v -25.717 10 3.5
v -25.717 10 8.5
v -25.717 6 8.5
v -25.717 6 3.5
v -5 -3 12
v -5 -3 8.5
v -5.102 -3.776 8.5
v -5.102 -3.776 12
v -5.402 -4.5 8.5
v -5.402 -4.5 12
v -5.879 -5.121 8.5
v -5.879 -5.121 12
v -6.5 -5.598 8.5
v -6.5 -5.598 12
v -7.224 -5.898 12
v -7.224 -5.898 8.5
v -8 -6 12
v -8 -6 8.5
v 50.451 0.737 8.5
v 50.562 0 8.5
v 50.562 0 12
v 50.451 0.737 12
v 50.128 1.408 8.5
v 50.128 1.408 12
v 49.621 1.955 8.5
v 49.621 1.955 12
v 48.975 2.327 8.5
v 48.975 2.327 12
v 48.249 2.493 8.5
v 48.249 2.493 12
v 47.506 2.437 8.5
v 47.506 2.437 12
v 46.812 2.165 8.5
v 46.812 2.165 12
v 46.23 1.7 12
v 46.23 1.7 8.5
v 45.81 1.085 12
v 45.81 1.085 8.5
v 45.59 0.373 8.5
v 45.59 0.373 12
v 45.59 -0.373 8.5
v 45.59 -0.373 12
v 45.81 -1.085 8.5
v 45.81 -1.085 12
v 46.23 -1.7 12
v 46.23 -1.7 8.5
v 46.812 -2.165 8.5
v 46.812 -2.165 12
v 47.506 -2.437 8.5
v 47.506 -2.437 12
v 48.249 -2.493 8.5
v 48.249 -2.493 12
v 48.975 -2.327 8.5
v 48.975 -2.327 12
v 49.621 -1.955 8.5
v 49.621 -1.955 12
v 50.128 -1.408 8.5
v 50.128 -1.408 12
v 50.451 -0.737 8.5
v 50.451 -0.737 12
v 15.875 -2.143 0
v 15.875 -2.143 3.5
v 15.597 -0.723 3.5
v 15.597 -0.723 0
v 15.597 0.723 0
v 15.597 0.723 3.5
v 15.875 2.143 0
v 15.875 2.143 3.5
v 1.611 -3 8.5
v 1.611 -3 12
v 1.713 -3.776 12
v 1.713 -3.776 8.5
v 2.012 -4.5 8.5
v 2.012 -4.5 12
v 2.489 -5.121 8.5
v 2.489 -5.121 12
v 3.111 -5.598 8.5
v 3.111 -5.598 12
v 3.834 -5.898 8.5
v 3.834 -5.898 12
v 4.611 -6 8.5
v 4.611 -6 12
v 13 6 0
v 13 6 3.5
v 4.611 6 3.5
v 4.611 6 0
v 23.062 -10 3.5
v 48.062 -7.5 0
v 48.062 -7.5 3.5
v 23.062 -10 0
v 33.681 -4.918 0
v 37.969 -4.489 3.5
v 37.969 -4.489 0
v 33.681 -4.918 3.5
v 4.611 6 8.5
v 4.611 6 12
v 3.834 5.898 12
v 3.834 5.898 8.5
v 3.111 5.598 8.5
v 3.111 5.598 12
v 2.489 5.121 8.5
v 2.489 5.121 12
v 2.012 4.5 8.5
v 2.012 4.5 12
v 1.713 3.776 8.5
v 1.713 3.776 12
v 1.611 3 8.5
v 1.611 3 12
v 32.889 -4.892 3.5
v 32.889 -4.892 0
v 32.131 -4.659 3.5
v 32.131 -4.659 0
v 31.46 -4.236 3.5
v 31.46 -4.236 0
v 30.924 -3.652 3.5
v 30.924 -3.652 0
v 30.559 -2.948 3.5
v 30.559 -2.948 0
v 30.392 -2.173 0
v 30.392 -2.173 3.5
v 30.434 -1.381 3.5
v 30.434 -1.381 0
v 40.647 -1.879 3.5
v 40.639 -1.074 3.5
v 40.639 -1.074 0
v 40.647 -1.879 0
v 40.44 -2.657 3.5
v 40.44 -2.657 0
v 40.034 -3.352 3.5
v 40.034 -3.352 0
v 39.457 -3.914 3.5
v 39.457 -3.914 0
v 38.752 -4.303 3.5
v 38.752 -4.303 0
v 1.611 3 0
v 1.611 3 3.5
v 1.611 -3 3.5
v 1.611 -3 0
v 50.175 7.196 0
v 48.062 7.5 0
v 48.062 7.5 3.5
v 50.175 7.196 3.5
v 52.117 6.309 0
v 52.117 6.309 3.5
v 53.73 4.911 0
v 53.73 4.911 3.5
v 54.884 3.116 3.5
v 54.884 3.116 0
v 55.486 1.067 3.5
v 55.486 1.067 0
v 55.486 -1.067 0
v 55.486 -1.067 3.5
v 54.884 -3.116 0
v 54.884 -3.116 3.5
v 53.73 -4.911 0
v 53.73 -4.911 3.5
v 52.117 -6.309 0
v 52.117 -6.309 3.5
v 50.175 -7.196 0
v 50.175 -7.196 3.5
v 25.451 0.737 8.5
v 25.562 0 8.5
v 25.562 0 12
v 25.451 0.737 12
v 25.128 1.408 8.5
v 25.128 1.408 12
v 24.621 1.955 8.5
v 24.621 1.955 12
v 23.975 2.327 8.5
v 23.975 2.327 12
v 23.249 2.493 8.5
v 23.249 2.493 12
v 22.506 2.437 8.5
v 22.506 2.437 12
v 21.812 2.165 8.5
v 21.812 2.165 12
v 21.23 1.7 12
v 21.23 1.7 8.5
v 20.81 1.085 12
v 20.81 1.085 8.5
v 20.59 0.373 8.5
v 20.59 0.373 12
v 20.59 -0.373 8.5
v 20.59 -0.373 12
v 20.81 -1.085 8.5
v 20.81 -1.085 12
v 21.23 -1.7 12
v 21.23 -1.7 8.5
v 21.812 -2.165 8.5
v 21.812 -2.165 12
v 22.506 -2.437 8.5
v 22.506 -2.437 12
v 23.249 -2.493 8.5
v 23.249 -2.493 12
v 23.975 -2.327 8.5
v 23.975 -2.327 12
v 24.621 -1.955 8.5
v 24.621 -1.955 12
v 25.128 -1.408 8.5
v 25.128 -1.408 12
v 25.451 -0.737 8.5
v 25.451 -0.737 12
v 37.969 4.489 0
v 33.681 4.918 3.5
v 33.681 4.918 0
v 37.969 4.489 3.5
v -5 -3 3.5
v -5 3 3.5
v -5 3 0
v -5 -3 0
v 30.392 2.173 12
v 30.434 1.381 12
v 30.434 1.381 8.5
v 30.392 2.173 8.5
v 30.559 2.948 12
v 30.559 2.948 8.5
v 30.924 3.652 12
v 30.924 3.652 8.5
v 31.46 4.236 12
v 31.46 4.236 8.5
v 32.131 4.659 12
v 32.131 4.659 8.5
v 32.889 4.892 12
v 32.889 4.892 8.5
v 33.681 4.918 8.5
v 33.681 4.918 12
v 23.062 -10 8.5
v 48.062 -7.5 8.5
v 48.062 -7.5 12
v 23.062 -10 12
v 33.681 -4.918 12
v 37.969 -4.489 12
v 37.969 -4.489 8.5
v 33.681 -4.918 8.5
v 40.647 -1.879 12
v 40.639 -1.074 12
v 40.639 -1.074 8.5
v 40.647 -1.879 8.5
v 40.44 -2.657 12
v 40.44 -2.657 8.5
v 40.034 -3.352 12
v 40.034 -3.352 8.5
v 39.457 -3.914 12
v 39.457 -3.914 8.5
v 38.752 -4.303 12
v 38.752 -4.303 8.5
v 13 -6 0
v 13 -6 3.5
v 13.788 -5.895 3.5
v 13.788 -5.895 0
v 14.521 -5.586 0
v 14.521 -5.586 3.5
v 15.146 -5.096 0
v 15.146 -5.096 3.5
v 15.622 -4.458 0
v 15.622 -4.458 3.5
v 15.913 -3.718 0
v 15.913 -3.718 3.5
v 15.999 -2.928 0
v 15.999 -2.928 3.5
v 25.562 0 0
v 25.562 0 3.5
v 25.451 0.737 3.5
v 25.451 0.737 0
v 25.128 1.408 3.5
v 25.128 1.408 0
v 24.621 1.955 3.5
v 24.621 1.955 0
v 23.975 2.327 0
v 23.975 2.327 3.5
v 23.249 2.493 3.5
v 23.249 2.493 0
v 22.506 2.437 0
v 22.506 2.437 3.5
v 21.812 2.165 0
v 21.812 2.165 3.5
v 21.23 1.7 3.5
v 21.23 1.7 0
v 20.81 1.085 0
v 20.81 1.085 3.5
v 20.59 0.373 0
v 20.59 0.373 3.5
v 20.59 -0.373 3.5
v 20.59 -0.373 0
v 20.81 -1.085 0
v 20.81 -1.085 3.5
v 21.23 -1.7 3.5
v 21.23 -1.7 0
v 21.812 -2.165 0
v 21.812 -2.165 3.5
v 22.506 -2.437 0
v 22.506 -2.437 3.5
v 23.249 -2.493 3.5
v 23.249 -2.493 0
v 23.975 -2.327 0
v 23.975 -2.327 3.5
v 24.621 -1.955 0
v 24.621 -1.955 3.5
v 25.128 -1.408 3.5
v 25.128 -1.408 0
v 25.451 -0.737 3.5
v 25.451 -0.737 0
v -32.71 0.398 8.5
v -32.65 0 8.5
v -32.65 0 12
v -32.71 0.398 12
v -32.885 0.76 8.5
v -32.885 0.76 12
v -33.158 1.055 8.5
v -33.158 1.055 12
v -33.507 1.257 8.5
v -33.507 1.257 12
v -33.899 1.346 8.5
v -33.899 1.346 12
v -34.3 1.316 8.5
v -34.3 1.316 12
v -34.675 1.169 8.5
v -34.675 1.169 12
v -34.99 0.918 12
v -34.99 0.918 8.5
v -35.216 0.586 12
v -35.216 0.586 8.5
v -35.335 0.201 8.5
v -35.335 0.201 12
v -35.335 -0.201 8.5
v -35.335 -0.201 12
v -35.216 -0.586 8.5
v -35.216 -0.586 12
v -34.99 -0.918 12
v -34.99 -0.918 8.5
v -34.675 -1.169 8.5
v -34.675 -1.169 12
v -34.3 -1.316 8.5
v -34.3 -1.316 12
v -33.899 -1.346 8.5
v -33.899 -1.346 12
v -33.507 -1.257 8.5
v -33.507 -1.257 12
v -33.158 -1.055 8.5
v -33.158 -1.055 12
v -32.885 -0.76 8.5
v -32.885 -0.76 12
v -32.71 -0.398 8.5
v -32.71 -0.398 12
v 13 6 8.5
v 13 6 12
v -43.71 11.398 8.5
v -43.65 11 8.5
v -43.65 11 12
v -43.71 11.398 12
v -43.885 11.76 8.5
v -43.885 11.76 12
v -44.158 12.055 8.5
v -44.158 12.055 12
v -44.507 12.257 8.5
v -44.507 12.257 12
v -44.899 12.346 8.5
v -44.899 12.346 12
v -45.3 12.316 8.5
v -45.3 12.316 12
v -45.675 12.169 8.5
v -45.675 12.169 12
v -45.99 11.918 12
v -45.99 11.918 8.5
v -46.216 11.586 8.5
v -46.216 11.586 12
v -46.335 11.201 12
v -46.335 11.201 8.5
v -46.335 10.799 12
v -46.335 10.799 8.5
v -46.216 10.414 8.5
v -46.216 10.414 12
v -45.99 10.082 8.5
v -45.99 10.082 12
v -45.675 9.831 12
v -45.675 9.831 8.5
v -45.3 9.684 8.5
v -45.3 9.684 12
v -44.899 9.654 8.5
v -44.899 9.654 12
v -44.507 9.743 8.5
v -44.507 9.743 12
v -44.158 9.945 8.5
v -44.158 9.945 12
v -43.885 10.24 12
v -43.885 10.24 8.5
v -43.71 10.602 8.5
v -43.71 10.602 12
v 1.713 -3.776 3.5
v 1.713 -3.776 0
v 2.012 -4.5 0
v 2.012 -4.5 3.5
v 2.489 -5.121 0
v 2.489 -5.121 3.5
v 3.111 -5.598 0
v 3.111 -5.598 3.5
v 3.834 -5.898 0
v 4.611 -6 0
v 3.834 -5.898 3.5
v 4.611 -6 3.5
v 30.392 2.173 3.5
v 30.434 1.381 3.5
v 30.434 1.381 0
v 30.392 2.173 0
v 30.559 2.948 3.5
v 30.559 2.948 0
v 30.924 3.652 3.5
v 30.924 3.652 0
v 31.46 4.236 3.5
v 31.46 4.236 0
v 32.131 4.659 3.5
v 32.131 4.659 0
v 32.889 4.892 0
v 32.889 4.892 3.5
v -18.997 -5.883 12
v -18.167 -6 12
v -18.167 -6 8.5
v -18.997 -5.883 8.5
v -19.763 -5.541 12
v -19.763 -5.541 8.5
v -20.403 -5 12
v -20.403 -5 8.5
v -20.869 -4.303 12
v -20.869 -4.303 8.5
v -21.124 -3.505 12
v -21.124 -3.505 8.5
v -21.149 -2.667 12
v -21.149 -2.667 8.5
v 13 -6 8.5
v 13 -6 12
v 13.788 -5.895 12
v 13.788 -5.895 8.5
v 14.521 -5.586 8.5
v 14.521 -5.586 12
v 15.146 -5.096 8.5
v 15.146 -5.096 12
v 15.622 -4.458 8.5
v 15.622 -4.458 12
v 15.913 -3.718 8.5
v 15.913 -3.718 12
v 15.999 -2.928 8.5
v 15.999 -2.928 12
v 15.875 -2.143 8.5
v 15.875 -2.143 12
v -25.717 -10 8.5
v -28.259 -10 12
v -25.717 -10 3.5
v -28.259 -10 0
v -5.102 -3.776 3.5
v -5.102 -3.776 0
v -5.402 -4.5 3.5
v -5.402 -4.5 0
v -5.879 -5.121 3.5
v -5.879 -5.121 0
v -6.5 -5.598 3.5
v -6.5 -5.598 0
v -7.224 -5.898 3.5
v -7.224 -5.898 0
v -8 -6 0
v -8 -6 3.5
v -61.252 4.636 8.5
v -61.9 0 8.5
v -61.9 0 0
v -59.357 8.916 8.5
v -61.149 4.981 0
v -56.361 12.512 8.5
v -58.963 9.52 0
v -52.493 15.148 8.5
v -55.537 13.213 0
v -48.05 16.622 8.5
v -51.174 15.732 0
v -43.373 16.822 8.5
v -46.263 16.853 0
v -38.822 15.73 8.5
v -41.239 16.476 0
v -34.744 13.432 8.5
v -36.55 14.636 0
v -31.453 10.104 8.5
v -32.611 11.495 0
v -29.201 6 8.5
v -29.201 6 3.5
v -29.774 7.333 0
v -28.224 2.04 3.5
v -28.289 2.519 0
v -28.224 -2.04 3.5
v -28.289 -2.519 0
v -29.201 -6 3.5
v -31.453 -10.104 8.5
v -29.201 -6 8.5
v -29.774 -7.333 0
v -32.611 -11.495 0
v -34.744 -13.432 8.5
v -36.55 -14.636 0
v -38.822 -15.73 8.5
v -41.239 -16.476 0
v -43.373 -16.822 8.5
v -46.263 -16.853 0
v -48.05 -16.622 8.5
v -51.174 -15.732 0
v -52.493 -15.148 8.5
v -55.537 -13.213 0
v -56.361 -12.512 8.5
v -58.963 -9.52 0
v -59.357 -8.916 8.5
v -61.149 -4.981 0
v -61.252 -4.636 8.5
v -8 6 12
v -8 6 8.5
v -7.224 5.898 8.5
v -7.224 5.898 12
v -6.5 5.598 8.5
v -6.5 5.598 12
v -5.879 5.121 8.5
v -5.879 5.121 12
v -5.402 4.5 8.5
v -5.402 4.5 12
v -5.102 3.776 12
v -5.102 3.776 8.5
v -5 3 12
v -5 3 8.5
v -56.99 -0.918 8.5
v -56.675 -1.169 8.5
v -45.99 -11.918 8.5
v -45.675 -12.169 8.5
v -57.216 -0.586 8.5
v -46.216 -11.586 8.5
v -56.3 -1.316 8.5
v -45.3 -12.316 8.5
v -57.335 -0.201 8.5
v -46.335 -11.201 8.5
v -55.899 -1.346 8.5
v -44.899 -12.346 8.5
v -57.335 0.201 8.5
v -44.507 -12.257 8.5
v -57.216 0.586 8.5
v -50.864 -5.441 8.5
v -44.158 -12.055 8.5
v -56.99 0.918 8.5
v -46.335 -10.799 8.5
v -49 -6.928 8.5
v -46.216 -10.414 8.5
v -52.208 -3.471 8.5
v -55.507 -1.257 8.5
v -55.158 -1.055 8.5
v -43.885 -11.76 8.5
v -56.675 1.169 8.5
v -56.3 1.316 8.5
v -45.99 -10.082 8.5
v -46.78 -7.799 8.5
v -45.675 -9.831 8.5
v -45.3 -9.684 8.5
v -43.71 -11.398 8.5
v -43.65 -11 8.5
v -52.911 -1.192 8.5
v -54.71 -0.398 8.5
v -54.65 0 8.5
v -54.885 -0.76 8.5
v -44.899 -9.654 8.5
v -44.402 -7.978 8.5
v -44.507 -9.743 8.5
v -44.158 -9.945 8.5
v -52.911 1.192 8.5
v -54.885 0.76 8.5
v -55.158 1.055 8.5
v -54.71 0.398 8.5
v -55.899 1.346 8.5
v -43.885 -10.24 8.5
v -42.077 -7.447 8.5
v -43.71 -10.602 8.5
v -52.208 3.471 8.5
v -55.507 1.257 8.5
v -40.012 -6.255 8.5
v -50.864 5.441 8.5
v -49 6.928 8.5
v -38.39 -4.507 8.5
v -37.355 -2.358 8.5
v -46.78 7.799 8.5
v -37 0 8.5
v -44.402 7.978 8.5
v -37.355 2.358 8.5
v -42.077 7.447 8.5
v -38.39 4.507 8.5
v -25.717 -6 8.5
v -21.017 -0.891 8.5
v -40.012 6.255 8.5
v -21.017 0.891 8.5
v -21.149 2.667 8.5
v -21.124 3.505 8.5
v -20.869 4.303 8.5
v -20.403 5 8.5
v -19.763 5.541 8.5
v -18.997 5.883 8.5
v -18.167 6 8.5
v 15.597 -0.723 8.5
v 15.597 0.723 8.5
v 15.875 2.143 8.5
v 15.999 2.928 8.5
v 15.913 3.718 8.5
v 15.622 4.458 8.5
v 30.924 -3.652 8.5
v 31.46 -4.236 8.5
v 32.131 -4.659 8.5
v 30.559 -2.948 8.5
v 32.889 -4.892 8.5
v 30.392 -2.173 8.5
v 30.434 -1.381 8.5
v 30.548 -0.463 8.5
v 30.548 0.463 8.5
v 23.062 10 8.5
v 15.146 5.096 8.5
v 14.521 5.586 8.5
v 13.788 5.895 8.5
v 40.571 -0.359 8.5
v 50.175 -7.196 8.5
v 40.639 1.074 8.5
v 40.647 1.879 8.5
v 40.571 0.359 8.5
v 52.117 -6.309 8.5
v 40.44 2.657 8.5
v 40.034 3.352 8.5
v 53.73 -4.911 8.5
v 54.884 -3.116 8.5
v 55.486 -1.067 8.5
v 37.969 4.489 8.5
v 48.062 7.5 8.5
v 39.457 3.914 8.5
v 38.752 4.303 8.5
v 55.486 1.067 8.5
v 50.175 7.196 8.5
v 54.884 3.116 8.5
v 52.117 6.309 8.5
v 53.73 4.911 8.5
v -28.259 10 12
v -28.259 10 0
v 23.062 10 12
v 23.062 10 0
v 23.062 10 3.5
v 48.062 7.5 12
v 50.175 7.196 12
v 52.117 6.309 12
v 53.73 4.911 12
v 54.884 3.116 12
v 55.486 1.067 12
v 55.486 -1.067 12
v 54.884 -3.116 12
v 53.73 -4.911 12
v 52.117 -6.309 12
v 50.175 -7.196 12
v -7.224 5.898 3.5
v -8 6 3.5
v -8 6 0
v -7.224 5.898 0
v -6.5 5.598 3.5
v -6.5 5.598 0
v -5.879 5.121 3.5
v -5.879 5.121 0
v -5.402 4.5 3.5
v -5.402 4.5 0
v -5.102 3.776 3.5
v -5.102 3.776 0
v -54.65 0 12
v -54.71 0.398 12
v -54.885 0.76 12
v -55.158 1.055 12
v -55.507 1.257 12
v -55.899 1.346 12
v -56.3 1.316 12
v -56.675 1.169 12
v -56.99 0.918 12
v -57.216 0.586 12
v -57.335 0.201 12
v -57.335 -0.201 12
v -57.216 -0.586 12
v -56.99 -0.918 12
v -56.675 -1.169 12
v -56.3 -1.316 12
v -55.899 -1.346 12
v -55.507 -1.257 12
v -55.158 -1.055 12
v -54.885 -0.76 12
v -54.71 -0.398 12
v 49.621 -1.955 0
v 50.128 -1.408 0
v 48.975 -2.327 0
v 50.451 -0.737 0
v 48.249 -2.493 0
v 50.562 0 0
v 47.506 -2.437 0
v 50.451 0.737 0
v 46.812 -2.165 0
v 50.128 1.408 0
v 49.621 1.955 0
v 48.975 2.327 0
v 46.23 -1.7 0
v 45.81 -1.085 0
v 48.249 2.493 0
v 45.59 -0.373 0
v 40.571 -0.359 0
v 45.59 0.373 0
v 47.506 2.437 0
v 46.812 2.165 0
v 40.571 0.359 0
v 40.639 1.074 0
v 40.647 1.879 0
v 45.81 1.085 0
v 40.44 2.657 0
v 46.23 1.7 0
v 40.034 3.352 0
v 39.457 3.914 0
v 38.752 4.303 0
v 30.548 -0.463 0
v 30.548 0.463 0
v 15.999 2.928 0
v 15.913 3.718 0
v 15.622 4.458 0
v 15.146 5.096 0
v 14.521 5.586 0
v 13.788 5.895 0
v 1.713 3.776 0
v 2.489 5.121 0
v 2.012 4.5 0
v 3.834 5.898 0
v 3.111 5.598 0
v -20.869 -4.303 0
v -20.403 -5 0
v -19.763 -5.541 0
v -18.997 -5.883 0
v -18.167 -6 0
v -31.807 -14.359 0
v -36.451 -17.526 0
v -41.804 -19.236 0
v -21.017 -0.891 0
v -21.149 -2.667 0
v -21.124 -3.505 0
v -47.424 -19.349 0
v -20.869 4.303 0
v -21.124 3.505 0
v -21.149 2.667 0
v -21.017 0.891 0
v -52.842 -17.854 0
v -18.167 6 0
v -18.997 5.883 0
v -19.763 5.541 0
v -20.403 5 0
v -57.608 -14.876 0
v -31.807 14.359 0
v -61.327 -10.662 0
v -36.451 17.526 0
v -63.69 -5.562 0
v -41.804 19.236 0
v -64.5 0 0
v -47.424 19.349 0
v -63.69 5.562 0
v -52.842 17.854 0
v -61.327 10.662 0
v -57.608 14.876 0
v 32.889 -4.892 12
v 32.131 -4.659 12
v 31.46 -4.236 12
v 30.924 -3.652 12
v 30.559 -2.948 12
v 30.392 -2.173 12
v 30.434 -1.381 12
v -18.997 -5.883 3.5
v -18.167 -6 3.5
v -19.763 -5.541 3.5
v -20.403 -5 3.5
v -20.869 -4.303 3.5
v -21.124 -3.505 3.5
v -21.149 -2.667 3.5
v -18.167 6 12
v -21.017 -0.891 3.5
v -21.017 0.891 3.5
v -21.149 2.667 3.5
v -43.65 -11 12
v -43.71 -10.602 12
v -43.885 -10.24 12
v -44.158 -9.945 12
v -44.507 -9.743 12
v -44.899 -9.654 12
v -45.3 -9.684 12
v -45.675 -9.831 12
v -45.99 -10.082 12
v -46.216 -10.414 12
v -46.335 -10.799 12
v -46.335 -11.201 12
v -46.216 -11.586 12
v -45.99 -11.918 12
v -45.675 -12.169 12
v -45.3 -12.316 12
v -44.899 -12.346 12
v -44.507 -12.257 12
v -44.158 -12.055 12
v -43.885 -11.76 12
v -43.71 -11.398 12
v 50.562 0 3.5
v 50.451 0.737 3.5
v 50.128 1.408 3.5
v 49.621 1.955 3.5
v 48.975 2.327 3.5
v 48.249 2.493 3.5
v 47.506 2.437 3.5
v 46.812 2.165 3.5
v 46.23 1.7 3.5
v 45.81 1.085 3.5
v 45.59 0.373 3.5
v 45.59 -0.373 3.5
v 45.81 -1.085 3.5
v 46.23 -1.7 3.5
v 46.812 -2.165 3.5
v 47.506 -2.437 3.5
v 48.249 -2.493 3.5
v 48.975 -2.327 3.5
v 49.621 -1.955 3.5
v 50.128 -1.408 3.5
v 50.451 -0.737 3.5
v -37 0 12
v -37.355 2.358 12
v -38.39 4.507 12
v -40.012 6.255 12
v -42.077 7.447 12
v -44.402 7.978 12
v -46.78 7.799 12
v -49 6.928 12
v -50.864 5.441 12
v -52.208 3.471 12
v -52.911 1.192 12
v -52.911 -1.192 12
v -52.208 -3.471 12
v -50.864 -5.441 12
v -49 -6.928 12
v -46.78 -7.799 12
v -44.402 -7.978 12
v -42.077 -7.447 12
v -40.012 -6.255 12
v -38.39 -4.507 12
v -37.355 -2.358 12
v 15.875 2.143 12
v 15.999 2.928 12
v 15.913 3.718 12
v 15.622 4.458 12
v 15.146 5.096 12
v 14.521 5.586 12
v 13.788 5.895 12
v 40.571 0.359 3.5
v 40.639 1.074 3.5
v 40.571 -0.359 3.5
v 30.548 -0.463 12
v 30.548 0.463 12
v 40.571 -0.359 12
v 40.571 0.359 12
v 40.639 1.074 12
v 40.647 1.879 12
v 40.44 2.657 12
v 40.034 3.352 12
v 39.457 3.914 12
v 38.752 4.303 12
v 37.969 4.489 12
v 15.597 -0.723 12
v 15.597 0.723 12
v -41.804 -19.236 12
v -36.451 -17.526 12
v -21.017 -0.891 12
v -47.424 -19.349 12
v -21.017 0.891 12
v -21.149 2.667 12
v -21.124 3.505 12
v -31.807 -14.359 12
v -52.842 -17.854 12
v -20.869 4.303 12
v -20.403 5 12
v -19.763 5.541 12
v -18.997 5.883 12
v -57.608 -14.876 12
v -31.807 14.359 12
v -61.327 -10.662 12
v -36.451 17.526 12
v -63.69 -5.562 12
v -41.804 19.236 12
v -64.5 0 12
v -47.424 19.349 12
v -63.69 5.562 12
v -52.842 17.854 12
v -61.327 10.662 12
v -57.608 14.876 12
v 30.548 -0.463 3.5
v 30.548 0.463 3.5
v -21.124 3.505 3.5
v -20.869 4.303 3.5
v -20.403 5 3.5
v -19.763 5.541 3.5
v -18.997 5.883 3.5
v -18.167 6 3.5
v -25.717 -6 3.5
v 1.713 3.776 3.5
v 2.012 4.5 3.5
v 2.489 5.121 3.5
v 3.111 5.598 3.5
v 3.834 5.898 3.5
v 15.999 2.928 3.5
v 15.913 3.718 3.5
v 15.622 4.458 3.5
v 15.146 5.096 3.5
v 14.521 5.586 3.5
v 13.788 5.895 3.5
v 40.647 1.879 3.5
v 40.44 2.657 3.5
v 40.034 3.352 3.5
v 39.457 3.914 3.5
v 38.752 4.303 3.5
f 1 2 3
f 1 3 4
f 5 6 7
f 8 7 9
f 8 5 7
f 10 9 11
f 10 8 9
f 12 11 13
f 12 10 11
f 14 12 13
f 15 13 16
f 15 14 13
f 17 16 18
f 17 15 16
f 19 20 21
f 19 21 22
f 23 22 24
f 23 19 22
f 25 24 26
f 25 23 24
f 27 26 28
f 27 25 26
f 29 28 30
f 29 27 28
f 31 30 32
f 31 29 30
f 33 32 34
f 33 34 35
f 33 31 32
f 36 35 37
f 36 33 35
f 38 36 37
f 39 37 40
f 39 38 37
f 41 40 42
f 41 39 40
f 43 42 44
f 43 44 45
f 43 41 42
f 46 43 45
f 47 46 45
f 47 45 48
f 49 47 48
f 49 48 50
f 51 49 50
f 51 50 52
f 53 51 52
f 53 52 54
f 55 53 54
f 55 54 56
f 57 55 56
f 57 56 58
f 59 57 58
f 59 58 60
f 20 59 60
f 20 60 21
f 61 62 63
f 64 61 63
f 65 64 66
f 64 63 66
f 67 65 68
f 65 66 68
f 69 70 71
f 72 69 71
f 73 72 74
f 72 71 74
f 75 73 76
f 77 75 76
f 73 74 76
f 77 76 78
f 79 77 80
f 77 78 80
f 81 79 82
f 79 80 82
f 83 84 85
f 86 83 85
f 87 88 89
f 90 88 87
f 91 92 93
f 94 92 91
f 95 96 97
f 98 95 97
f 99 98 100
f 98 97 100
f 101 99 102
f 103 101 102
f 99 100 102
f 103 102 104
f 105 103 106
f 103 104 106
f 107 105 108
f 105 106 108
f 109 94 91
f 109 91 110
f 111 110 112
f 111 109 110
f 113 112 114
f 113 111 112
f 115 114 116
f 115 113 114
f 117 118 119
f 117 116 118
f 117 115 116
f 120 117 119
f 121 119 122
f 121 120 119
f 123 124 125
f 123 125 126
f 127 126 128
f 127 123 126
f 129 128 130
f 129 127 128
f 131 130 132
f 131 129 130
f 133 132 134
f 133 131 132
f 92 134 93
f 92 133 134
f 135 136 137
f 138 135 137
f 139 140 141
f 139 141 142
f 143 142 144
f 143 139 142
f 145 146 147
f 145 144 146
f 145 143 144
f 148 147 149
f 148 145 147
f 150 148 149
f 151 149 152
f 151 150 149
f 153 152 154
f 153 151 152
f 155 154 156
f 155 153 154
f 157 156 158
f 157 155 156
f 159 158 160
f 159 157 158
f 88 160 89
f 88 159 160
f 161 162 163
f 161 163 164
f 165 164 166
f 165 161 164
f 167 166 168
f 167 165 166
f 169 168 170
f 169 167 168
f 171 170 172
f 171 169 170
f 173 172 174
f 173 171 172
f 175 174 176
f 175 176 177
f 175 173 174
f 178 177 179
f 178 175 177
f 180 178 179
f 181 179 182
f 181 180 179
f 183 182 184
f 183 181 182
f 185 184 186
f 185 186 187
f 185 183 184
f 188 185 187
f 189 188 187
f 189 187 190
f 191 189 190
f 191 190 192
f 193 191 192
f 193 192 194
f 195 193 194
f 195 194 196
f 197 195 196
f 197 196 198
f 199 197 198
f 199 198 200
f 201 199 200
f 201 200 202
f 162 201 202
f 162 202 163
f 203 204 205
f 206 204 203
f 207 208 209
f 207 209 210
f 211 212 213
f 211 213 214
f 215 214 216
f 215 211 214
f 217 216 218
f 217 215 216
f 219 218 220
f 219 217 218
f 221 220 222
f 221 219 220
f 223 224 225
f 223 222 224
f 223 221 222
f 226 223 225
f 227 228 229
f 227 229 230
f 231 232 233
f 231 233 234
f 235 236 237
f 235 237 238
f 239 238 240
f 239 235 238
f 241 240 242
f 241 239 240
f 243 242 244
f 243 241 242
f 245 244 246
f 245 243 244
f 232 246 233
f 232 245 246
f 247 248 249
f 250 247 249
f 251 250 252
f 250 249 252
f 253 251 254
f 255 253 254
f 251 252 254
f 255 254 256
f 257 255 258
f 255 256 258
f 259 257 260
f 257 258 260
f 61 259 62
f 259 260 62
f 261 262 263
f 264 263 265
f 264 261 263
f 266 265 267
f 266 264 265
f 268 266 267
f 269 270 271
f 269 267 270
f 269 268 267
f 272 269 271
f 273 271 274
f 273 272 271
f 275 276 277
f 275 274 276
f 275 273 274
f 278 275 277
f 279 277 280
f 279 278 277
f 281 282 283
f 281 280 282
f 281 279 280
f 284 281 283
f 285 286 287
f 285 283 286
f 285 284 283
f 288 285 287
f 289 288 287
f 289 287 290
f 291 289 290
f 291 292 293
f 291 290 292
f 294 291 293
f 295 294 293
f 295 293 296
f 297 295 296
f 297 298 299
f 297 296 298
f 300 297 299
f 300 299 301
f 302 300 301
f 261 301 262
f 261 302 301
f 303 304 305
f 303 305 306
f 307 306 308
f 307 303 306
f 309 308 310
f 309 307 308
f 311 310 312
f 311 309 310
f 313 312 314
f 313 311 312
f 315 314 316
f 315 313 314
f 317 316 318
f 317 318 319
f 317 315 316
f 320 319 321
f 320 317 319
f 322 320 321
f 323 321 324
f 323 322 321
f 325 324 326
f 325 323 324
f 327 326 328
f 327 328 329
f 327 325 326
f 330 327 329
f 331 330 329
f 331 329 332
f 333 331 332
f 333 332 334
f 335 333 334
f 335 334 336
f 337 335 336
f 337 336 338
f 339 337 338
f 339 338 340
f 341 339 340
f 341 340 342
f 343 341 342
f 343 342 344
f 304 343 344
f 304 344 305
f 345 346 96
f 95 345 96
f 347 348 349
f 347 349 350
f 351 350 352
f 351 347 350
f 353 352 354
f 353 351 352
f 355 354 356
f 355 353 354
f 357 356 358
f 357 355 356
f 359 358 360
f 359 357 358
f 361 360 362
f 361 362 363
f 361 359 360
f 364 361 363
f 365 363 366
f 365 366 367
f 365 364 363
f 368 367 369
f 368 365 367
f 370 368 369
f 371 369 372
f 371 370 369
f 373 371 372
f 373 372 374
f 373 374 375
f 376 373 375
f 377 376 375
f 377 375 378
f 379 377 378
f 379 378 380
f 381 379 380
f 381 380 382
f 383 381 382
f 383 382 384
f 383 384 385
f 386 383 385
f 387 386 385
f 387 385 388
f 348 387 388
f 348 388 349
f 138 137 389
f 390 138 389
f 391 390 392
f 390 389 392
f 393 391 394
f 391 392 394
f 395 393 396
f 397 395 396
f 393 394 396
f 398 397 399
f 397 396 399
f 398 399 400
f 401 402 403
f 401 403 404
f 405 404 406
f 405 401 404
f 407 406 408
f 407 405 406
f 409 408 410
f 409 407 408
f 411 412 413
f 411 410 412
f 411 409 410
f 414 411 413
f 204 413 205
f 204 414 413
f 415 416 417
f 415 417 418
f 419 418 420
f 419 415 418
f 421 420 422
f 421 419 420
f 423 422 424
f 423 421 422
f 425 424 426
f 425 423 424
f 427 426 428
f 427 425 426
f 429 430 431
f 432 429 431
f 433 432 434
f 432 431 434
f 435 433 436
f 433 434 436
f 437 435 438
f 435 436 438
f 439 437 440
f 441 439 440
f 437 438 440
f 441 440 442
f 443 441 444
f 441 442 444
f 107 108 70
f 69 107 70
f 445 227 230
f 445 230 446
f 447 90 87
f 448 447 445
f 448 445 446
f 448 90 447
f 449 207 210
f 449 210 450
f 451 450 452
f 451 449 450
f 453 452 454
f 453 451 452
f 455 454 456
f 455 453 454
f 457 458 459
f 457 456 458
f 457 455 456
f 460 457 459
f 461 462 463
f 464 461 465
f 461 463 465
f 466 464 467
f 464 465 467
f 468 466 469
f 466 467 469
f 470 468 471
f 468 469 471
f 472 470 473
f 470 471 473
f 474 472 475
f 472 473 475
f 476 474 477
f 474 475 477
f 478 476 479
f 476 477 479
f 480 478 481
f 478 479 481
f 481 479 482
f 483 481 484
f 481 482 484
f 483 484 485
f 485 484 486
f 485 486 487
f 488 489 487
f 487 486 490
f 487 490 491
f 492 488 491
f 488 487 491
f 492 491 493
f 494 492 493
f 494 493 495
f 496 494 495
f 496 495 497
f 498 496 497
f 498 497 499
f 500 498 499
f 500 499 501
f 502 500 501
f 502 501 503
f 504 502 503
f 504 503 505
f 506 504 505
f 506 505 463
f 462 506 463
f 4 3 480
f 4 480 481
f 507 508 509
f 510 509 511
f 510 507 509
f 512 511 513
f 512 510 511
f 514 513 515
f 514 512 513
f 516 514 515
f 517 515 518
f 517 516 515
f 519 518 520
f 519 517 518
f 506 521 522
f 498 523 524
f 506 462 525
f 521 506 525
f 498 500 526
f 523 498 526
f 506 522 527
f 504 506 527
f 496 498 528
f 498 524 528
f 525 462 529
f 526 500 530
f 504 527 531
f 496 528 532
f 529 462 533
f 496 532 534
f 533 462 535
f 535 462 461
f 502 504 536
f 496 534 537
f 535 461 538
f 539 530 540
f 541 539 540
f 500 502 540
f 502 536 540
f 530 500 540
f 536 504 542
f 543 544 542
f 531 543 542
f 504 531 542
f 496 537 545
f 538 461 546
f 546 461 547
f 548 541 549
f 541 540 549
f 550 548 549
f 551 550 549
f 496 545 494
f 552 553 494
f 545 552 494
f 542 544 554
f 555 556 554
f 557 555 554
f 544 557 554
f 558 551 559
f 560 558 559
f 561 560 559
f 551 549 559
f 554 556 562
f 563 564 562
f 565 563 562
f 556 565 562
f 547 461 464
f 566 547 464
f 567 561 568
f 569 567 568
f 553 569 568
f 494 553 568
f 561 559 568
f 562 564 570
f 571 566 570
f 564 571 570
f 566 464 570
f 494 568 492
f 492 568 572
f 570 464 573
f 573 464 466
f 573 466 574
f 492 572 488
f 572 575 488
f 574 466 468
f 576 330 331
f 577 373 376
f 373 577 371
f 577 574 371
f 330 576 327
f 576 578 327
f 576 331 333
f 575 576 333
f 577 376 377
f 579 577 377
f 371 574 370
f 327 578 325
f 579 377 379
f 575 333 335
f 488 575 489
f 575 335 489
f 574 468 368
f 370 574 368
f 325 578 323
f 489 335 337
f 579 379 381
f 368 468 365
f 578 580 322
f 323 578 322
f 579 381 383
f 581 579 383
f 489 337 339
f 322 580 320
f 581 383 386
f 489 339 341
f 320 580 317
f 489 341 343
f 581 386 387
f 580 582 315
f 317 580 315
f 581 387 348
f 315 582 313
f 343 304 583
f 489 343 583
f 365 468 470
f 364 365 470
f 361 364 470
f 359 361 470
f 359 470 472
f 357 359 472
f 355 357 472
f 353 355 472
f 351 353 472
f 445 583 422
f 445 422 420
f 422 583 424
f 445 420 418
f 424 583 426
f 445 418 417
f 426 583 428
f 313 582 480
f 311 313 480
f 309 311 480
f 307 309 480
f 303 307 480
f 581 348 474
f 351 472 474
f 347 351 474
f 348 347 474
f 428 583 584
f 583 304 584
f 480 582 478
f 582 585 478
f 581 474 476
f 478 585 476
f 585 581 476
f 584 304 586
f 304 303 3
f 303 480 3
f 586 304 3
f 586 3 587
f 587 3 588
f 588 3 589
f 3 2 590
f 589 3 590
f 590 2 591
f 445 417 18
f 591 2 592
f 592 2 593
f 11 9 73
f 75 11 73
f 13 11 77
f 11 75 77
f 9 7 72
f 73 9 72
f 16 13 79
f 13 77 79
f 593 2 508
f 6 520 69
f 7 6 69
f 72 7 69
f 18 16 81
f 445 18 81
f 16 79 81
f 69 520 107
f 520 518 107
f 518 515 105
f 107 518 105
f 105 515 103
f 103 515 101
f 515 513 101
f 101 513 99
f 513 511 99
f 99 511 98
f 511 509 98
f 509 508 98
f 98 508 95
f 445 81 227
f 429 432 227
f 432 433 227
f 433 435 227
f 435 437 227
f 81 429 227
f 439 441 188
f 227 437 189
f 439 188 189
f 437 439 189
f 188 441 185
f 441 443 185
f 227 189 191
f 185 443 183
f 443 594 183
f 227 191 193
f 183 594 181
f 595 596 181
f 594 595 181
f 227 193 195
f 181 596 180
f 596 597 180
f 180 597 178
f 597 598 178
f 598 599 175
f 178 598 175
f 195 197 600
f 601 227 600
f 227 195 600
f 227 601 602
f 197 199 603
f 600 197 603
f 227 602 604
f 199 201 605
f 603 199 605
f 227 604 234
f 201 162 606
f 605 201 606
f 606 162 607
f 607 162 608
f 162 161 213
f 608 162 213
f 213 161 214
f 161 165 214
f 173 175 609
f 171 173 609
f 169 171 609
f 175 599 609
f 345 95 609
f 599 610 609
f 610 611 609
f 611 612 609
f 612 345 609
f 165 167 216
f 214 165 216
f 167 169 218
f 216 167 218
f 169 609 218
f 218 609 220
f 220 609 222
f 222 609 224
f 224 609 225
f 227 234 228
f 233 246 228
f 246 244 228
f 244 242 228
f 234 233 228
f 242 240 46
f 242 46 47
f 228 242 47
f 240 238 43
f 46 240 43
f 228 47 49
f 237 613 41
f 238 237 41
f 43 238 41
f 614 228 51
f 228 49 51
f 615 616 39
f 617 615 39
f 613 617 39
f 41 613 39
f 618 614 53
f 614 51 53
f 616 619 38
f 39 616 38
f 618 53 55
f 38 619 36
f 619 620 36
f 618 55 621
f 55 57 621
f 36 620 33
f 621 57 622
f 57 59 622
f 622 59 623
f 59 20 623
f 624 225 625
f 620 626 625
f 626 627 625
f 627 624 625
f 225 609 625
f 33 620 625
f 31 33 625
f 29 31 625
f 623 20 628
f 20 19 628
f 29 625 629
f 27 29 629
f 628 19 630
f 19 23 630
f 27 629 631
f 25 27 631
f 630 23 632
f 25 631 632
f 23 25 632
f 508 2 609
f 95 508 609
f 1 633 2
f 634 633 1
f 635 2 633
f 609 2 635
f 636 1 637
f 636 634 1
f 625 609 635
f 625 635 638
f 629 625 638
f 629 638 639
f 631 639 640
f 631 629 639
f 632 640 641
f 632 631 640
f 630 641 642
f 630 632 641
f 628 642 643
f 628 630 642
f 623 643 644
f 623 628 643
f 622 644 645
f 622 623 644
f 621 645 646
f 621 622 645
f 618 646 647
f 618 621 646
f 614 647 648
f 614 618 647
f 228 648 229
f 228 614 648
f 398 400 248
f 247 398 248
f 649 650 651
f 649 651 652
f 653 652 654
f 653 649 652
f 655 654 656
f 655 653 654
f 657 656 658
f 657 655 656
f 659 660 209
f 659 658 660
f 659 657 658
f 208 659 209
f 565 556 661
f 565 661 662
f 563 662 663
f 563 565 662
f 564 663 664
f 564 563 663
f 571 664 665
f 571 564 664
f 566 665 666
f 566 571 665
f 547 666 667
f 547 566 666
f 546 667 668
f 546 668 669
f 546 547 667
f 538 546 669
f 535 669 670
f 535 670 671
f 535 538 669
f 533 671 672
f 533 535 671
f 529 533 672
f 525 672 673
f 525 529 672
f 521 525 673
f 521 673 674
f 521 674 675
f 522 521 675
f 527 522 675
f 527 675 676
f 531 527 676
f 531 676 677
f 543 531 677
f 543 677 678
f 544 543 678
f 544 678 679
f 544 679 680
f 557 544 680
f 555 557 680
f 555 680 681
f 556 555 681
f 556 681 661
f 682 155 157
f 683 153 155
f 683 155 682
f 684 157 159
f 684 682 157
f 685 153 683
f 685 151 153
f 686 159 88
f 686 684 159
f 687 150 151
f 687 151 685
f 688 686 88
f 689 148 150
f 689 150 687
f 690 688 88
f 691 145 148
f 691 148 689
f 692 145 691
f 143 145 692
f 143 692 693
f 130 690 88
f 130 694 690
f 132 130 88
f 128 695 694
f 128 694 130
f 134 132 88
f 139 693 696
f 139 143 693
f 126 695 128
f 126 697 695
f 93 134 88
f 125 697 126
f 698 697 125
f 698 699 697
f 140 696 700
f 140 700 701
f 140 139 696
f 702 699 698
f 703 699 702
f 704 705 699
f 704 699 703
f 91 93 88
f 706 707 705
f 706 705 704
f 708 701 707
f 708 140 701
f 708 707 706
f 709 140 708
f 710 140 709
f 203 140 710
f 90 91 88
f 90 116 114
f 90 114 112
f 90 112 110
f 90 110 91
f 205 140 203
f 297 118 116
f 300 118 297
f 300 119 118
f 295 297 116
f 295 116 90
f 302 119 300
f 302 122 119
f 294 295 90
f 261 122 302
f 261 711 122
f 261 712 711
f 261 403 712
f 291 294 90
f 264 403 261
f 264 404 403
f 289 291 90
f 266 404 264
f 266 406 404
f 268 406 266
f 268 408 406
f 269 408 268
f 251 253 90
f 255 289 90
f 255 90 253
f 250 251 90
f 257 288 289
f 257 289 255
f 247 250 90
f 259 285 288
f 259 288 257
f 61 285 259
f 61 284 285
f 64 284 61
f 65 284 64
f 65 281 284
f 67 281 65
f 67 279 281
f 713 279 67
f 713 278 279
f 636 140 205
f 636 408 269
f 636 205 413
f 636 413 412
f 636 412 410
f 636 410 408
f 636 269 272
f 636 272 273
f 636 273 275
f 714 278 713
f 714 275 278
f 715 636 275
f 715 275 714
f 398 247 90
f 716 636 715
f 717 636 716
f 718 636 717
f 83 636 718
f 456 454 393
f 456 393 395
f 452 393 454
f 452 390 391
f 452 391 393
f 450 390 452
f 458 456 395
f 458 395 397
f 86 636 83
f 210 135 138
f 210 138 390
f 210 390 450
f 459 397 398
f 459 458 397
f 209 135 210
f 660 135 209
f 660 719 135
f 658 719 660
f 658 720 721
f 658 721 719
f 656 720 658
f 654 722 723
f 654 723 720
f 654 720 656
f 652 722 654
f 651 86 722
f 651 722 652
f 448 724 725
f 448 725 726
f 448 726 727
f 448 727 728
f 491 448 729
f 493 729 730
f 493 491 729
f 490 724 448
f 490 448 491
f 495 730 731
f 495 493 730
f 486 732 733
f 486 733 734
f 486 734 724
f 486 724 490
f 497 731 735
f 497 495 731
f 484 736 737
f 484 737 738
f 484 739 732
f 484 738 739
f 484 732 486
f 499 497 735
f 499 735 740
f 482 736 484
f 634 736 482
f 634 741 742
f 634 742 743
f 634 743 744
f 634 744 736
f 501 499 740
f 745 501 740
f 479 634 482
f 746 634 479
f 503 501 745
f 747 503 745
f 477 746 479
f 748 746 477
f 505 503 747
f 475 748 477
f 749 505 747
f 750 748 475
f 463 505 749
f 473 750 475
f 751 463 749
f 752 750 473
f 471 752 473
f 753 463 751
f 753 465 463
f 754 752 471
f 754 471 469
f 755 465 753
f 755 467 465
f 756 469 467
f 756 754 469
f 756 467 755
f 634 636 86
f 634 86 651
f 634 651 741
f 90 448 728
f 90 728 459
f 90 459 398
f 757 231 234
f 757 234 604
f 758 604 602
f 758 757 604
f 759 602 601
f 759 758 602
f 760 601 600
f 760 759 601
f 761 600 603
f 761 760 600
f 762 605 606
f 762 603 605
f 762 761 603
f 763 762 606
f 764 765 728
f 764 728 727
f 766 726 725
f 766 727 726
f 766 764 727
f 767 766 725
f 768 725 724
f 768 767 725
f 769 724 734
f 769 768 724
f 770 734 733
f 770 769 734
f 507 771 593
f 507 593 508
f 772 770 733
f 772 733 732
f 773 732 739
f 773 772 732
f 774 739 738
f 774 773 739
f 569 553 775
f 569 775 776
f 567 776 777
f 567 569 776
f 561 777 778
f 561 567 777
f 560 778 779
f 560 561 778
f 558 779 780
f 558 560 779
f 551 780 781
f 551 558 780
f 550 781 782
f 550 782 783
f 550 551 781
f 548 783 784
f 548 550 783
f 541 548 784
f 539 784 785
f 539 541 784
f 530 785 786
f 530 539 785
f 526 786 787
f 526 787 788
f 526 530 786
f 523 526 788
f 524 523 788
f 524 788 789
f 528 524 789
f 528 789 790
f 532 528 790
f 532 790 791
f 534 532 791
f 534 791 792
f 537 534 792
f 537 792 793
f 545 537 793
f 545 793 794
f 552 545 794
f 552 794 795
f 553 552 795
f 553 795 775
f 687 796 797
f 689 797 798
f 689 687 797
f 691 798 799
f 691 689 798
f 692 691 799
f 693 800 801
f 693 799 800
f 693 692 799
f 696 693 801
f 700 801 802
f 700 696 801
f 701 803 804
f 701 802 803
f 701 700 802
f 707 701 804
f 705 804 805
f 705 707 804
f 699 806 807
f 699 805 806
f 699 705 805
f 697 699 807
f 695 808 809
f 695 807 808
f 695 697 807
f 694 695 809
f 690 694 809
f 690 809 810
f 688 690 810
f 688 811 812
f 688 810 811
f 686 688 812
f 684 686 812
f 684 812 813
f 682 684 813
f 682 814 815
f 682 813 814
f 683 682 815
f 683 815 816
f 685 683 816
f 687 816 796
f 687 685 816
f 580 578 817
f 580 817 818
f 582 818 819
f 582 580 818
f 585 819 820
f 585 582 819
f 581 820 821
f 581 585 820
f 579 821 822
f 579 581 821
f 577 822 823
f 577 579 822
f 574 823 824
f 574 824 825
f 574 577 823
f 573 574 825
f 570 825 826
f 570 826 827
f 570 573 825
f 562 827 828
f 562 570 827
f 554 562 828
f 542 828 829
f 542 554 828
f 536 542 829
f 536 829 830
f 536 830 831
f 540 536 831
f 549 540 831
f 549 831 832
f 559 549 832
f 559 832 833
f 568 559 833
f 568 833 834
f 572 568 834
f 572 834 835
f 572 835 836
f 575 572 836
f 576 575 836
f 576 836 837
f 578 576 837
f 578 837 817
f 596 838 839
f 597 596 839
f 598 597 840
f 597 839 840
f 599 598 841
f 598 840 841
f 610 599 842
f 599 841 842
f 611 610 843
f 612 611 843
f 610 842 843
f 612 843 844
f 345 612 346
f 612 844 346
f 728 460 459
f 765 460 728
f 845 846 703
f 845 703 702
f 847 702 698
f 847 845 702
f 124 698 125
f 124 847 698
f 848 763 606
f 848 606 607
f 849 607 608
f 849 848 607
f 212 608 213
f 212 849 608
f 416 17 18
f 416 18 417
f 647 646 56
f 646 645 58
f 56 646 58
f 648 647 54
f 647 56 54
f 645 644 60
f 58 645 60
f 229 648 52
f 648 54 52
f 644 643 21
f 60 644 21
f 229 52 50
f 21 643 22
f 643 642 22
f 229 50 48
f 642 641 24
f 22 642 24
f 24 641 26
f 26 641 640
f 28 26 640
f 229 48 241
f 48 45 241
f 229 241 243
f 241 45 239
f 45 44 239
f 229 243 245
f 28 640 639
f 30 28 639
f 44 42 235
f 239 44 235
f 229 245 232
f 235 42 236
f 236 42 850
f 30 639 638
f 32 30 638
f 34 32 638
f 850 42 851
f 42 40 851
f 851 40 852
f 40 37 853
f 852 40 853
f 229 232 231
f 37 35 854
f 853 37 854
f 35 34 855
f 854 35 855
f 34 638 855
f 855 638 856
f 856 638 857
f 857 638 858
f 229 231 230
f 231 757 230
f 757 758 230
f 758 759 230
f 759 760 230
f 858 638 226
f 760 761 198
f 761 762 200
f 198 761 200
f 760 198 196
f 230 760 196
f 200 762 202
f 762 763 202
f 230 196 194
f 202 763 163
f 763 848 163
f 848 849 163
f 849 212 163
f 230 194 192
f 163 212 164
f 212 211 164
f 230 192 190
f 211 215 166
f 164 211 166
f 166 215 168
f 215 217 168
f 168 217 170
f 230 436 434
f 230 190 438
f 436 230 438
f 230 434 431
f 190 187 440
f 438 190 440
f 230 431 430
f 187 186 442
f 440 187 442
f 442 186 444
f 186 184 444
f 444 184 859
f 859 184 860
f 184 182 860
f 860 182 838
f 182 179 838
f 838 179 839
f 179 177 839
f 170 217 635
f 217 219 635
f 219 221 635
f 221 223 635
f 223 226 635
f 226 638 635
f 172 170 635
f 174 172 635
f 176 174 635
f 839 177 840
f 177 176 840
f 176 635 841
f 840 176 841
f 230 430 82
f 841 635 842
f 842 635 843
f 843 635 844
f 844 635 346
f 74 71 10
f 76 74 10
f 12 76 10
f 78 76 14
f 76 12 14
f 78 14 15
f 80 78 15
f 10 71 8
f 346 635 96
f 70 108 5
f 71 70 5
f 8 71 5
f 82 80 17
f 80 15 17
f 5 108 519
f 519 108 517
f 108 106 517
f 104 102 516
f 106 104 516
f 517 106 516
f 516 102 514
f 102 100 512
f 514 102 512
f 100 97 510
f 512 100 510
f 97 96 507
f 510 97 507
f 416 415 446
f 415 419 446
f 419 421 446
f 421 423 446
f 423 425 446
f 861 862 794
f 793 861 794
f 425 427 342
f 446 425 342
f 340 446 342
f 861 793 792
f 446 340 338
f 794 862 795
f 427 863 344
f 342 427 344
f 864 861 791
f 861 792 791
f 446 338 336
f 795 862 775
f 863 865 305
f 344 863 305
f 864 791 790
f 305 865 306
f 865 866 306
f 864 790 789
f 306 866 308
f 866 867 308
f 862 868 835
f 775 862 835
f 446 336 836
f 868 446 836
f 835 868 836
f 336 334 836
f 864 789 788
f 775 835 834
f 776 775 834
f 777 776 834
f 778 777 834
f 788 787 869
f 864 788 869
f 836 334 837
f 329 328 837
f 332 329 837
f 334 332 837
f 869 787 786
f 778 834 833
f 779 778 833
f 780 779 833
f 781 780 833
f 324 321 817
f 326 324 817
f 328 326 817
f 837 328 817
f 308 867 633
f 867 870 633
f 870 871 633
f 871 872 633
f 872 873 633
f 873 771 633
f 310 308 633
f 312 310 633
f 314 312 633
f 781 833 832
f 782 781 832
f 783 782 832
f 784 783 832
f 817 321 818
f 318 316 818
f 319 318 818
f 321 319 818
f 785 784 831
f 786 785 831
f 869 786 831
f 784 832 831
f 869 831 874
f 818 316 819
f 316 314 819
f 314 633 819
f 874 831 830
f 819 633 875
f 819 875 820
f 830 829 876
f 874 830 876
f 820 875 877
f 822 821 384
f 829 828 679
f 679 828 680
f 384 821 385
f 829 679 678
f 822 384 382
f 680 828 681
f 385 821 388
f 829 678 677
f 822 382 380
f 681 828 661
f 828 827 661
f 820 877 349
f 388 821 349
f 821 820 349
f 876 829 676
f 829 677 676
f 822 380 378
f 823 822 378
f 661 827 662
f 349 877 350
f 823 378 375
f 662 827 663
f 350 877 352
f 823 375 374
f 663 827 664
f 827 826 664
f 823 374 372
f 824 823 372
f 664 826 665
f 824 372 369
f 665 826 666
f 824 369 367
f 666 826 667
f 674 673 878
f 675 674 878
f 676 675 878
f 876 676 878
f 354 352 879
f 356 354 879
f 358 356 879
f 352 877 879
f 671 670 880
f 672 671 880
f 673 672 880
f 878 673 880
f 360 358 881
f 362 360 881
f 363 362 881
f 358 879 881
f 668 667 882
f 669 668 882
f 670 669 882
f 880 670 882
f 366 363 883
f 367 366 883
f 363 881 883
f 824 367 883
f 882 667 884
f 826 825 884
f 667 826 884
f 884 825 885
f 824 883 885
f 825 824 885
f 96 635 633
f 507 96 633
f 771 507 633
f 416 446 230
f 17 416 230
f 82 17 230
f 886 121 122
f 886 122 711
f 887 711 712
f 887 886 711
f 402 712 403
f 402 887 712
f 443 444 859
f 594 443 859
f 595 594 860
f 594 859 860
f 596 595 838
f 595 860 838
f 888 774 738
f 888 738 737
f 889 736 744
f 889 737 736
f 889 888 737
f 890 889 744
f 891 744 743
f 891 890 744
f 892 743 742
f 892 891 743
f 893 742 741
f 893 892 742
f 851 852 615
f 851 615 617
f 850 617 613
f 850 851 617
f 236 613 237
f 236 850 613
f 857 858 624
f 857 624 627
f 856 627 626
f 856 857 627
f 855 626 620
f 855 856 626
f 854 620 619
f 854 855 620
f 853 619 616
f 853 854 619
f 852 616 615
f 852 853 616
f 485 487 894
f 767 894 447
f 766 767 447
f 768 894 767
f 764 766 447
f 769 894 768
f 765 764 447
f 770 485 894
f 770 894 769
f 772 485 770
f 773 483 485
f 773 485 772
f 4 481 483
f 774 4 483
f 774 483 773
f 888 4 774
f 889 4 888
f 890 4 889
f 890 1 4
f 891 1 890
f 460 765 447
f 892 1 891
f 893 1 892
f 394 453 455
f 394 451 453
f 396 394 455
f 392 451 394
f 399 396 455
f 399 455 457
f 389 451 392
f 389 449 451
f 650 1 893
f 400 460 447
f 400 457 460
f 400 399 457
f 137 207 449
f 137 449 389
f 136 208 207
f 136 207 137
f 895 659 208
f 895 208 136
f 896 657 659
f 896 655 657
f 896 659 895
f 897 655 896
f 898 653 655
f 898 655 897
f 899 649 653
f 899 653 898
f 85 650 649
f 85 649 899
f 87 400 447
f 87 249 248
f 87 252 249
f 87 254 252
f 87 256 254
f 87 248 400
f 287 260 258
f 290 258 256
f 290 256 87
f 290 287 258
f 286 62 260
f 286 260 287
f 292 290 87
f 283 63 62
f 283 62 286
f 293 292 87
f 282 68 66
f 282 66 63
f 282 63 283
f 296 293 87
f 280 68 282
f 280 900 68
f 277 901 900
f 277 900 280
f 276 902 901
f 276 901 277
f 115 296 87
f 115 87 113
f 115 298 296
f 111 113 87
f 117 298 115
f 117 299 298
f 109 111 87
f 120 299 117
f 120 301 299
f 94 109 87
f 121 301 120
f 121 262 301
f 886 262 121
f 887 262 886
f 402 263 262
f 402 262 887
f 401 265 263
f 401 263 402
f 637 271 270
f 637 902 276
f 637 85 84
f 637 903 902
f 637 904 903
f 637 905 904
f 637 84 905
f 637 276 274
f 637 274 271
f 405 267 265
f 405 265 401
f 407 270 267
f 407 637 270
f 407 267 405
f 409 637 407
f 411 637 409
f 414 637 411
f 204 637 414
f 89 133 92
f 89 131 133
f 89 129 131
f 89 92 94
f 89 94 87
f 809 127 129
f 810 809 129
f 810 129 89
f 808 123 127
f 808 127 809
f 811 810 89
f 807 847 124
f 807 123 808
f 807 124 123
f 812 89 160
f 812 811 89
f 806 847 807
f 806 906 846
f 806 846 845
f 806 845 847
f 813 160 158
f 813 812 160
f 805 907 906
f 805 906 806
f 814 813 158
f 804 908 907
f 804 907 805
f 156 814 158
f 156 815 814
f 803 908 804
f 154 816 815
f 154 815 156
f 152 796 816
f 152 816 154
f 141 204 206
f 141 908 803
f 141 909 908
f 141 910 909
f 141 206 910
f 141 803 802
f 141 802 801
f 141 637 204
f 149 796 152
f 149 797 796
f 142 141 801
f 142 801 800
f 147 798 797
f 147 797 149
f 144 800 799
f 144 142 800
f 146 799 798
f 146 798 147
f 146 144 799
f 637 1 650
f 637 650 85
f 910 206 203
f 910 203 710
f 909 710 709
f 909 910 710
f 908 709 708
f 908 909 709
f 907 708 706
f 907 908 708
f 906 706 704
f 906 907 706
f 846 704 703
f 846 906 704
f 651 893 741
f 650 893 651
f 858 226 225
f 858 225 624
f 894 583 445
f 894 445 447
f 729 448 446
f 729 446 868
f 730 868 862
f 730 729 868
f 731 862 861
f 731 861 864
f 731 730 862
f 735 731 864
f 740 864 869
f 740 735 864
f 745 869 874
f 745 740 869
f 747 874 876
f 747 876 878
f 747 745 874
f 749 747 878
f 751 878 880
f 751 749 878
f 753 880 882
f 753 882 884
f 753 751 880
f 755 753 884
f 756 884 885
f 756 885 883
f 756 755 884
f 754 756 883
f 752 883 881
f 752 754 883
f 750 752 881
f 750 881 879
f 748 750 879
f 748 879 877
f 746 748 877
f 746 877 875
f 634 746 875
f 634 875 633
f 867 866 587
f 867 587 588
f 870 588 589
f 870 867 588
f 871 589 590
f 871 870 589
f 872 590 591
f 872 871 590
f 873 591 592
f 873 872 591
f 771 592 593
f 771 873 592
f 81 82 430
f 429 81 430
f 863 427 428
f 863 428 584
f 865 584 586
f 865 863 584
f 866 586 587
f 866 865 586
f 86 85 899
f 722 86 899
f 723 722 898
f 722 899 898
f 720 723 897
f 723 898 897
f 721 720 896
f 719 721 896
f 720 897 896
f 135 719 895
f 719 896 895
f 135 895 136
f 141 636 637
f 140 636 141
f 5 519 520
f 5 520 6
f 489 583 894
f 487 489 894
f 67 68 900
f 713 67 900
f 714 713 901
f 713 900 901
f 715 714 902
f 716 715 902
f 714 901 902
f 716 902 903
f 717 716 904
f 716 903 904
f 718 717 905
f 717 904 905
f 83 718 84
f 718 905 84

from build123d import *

# Parameters (mm, degrees)
SKETCH_2_R               = 1.35
SKETCH_2_R_2             = 2.5
EXTRUDE_1_DEPTH          = 12
SKETCH_3_W               = 81.279527938
SKETCH_3_H               = 5
CUT_EXTRUDE_1_DEPTH      = 72.933997526
SKETCH_4_R               = 16.9
CUT_EXTRUDE_2_DEPTH      = 8.5
SKETCH_5_R               = 8
CUT_EXTRUDE_3_DEPTH      = 68.917229037
CUT_EXTRUDE_4_REACH      = 86.443
CUT_EXTRUDE_4_END_RADIUS = 16.9
SKETCH_7_W               = 5
SKETCH_7_H               = 12
CUT_EXTRUDE_6_DEPTH      = 69.443407279
SKETCH_9_R               = 16.9
SKETCH_9_R_2             = 1.35
SKETCH_9_R_3             = 8
EXTRUDE_3_DEPTH          = 8.5
SKETCH_10_R              = 16.9
CUT_EXTRUDE_7_DEPTH      = 8.5


with BuildPart() as part:
    # 草图2 → 凸台-拉伸1 (new body)
    with BuildSketch(Plane.XY):
        with BuildLine():
            Line((-28.259330957, 10), (23.06213196, 10))
            Line((23.06213196, 10), (48.06213196, 7.5))
            ThreePointArc((48.06213196, 7.5), (55.56213196, 0), (48.06213196, -7.5))
            Line((48.06213196, -7.5), (23.06213196, -10))
            Line((23.06213196, -10), (-28.259330957, -10))
            ThreePointArc((-28.259330957, -10), (-64.5, 0), (-28.259330957, 10))
        make_face()
        with Locations((-34, 0)):
            Circle(SKETCH_2_R, mode=Mode.SUBTRACT)
        with Locations((-45, -11)):
            Circle(SKETCH_2_R, mode=Mode.SUBTRACT)
        with Locations((-56, 0)):
            Circle(SKETCH_2_R, mode=Mode.SUBTRACT)
        with Locations((-45, 11)):
            Circle(SKETCH_2_R, mode=Mode.SUBTRACT)
        with Locations((48.06213196, 0)):
            Circle(SKETCH_2_R_2, mode=Mode.SUBTRACT)
        with Locations((23.06213196, 0)):
            Circle(SKETCH_2_R_2, mode=Mode.SUBTRACT)
    extrude(amount=EXTRUDE_1_DEPTH)

    # 草图3 → 切除-拉伸1 (cut, through all)
    with BuildSketch(Plane(origin=(0, 10, 0), x_dir=(1, 0, 0), z_dir=(0, 1, 0))):
        with Locations((14.922367991, -6)):
            Rectangle(SKETCH_3_W, SKETCH_3_H)
    extrude(amount=-CUT_EXTRUDE_1_DEPTH, mode=Mode.SUBTRACT)

    # 草图4 → 切除-拉伸2 (cut)
    with BuildSketch(Plane.XY.offset(12)):
        with Locations((-45, 0)):
            Circle(SKETCH_4_R)
    extrude(amount=-CUT_EXTRUDE_2_DEPTH, mode=Mode.SUBTRACT)

    # 草图5 → 切除-拉伸3 (cut, through all)
    with BuildSketch(Plane.XY.offset(3.5)):
        with Locations((-45, 0)):
            Circle(SKETCH_5_R)
    extrude(amount=-CUT_EXTRUDE_3_DEPTH, mode=Mode.SUBTRACT)

    # 切除-拉伸4: up to this cylinder (the profile starts outside it)
    cut_extrude_4_end = Plane(origin=(-45, 0, 6), z_dir=(0, 0, 1)) * Cylinder(CUT_EXTRUDE_4_END_RADIUS, 207.686, mode=Mode.PRIVATE)
    # 草图7 → 切除-拉伸4 (cut, up to the surface)
    with BuildSketch(Plane(origin=(-25.717395978, 0, 0), x_dir=(0, 0, -1), z_dir=(1, 0, 0)), mode=Mode.PRIVATE) as cut_extrude_4_sk1:
        with Locations((-6, 0)):
            Rectangle(SKETCH_7_W, SKETCH_7_H)
    cut_extrude_4_tool1 = extrude(cut_extrude_4_sk1.sketch, amount=-CUT_EXTRUDE_4_REACH, mode=Mode.PRIVATE) - cut_extrude_4_end
    add(cut_extrude_4_tool1.solids().sort_by_distance((-25.717396, 0, 6))[0], mode=Mode.SUBTRACT)

    # 草图8 → 切除-拉伸6 (cut, through all)
    with BuildSketch(Plane.XY.offset(12)):
        with BuildLine():
            Line((-5, 3), (-5, -3))
            ThreePointArc((-5, -3), (-5.878679656, -5.121320344), (-8, -6))
            Line((-8, -6), (-18.16718427, -6))
            ThreePointArc((-18.16718427, -6), (-20.403252248, -5), (-21.14860824, -2.666666667))
            ThreePointArc((-21.14860824, -2.666666667), (-21, 0), (-21.14860824, 2.666666667))
            ThreePointArc((-21.14860824, 2.666666667), (-20.403252248, 5), (-18.16718427, 6))
            Line((-18.16718427, 6), (-8, 6))
            ThreePointArc((-8, 6), (-5.878679656, 5.121320344), (-5, 3))
        make_face()
        with BuildLine():
            Line((1.610541595, 3), (1.610541595, -3))
            ThreePointArc((1.610541595, -3), (2.489221251, -5.121320344), (4.610541595, -6))
            Line((4.610541595, -6), (12.999826061, -6))
            ThreePointArc((12.999826061, -6), (15.405177238, -4.792842914), (15.874770603, -2.142857143))
            ThreePointArc((15.874770603, -2.142857143), (15.56213196, 0), (15.874770603, 2.142857143))
            ThreePointArc((15.874770603, 2.142857143), (15.405177238, 4.792842914), (12.999826061, 6))
            Line((12.999826061, 6), (4.610541595, 6))
            ThreePointArc((4.610541595, 6), (2.489221251, 5.121320344), (1.610541595, 3))
        make_face()
        with BuildLine():
            Line((33.681175083, 4.918145439), (37.968953466, 4.489367601))
            ThreePointArc((37.968953466, 4.489367601), (40.033624407, 3.3523281), (40.639496495, 1.074468593))
            ThreePointArc((40.639496495, 1.074468593), (40.56213196, 0), (40.639496495, -1.074468593))
            ThreePointArc((40.639496495, -1.074468593), (40.033624407, -3.3523281), (37.968953466, -4.489367601))
            Line((37.968953466, -4.489367601), (33.681175083, -4.918145439))
            ThreePointArc((33.681175083, -4.918145439), (31.17263717, -3.961772821), (30.433940507, -1.380738478))
            ThreePointArc((30.433940507, -1.380738478), (30.56213196, 0), (30.433940507, 1.380738478))
            ThreePointArc((30.433940507, 1.380738478), (31.17263717, 3.961772821), (33.681175083, 4.918145439))
        make_face()
    extrude(amount=-CUT_EXTRUDE_6_DEPTH, mode=Mode.SUBTRACT)

    # 草图9 → 凸台-拉伸3 (add)
    with BuildSketch(Plane.XY.offset(3.5)):
        with Locations((-45, 0)):
            Circle(SKETCH_9_R)
        with Locations((-34, 0)):
            Circle(SKETCH_9_R_2, mode=Mode.SUBTRACT)
        with Locations((-45, -11)):
            Circle(SKETCH_9_R_2, mode=Mode.SUBTRACT)
        with Locations((-56, 0)):
            Circle(SKETCH_9_R_2, mode=Mode.SUBTRACT)
        with Locations((-45, 11)):
            Circle(SKETCH_9_R_2, mode=Mode.SUBTRACT)
        with Locations((-45, 0)):
            Circle(SKETCH_9_R_3, mode=Mode.SUBTRACT)
    extrude(amount=EXTRUDE_3_DEPTH)

    # 草图10 → 切除-拉伸7 (cut)
    with BuildSketch(Plane(origin=(0, 0, 0), x_dir=(-1, 0, 0), z_dir=(0, 0, -1))):
        with Locations((45, 0)):
            Circle(SKETCH_10_R)
    extrude(amount=-CUT_EXTRUDE_7_DEPTH, mode=Mode.SUBTRACT)


solid = part.part
